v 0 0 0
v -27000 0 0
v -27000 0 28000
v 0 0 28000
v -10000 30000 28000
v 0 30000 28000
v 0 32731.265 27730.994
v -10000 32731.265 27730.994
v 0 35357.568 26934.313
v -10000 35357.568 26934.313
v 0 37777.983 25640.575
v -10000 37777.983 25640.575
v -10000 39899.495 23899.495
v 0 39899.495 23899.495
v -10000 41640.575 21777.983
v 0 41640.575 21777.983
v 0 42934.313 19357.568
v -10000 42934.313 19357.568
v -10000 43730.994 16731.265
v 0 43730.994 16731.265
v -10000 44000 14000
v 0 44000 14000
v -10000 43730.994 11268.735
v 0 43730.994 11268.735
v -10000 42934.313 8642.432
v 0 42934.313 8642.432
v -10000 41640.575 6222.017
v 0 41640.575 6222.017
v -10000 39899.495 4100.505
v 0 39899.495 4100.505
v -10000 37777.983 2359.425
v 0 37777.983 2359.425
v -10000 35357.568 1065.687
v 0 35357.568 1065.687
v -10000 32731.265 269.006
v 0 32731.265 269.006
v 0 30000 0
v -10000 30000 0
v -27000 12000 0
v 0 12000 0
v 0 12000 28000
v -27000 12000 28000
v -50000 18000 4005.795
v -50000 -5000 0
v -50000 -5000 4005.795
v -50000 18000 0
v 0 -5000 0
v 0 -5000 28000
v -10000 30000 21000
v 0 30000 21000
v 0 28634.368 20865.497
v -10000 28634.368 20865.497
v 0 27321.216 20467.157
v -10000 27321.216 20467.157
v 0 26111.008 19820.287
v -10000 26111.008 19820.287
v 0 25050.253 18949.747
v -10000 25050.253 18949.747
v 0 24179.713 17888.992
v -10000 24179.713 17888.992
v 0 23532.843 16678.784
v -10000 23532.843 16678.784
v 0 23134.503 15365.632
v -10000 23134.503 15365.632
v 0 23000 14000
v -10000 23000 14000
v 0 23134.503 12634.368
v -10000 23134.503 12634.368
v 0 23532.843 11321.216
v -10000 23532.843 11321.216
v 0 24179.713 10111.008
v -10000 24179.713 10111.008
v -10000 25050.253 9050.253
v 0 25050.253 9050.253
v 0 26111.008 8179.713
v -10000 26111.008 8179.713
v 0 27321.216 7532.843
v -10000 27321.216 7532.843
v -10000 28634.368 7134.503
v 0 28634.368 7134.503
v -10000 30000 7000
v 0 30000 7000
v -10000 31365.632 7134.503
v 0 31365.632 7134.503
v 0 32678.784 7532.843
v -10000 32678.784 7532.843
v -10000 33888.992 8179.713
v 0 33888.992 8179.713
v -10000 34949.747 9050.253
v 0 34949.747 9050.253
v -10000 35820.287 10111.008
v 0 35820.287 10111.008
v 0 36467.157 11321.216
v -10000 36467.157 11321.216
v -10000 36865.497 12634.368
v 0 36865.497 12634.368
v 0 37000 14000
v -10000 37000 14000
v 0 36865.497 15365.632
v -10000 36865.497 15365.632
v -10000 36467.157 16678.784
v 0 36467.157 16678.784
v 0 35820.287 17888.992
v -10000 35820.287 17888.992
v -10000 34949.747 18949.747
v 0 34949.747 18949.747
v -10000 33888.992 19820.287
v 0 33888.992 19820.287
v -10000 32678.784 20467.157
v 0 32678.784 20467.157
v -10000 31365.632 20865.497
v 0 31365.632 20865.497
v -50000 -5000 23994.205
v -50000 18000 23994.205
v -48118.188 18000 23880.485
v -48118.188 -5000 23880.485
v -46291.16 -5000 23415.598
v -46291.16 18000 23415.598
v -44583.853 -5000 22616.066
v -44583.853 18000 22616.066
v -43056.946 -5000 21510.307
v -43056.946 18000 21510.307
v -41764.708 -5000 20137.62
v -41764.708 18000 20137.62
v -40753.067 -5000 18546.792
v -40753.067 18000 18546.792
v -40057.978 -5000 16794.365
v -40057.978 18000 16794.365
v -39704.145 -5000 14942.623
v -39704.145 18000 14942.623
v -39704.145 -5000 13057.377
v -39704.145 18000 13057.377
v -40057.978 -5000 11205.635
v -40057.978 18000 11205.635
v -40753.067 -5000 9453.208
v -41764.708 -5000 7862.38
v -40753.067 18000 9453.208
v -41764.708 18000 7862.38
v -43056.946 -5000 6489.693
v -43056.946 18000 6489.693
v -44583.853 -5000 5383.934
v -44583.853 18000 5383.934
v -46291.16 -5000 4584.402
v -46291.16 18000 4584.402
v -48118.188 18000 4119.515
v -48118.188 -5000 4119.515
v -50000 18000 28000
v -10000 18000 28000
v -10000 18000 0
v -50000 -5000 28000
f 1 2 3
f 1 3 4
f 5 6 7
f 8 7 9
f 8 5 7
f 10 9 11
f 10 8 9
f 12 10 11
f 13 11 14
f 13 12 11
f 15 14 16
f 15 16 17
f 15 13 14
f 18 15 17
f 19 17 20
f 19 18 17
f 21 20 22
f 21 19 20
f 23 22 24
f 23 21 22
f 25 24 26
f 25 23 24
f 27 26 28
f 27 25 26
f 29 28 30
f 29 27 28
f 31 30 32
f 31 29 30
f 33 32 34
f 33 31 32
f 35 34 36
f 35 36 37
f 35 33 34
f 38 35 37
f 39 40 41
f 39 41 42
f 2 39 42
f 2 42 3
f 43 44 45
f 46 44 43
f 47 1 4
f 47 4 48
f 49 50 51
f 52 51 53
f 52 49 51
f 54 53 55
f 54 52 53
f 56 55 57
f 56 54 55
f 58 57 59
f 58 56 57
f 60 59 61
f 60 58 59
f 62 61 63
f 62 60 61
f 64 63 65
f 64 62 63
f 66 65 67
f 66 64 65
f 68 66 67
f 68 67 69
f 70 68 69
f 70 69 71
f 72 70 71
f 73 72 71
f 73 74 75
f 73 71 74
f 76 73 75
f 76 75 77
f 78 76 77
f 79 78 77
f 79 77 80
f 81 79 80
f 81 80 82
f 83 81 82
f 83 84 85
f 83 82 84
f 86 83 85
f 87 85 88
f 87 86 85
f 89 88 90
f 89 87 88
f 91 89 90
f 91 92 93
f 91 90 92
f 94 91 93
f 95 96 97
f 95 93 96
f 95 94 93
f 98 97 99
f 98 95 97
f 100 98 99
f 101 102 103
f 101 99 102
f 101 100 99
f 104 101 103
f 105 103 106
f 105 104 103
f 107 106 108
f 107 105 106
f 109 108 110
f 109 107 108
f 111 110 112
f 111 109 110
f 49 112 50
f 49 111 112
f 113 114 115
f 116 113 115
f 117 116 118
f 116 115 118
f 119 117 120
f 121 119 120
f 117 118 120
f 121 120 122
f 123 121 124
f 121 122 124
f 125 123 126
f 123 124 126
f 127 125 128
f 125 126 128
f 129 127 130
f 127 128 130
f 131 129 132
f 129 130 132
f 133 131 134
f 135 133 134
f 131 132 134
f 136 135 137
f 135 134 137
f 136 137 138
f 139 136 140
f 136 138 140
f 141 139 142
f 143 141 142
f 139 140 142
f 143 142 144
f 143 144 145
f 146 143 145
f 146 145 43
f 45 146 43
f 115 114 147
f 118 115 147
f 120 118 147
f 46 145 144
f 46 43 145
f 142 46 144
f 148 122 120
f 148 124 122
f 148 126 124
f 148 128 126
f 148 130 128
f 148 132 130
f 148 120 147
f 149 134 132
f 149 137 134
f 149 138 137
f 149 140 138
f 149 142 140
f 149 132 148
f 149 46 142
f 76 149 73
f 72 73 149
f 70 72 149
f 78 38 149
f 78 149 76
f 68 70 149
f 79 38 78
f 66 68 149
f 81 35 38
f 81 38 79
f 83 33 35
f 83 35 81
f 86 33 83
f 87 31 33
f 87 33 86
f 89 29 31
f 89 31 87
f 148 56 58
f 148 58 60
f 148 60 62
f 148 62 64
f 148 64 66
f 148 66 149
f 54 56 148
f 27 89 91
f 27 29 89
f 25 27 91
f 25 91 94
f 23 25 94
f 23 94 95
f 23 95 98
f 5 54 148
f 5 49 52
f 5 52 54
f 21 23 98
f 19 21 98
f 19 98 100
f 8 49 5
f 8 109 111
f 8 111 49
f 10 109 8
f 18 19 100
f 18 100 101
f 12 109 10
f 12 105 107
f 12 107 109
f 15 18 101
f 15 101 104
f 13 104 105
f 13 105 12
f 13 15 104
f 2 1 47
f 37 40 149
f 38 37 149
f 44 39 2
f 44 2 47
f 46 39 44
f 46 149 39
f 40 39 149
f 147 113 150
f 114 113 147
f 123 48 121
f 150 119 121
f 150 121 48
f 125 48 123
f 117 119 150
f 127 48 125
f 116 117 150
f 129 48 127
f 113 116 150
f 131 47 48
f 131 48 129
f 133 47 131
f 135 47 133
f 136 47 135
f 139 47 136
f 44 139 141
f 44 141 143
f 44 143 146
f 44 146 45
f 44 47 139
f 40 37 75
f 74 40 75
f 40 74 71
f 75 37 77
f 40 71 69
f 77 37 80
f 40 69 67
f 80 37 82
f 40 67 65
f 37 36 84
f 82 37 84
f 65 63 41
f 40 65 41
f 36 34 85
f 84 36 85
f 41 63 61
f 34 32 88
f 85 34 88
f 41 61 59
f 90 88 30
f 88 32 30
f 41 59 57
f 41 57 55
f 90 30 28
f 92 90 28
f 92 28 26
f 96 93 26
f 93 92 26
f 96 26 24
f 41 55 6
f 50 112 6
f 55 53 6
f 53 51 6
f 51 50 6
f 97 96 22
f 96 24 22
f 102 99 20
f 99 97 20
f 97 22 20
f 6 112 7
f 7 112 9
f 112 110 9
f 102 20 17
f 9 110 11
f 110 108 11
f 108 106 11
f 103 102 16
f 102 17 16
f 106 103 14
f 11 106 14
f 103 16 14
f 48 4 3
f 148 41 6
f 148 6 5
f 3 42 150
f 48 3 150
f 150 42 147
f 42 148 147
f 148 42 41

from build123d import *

# Parameters (mm, degrees)
BOSS_EXTRUDE1_DEPTH = 28000
CUT_EXTRUDE1_DEPTH  = 61750.493925052
BOSS_EXTRUDE2_DEPTH = 10000
CUT_EXTRUDE2_DEPTH  = 65727.70690062


with BuildPart() as part:
    # Sketch1 → Boss-Extrude1 (new body)
    with BuildSketch(Plane.XY):
        Polygon((0, 0), (0, -5000), (-50000, -5000), (-50000, 18000), (-10000, 18000), (-10000, 30000), (0, 30000), (0, 12000), (-27000, 12000), (-27000, 0), align=None)
    extrude(amount=BOSS_EXTRUDE1_DEPTH)

    # Sketch2 → Cut-Extrude1 (cut, through all)
    with BuildSketch(Plane(origin=(0, 18000, 0), x_dir=(1, 0, 0), z_dir=(0, 1, 0))):
        with BuildLine():
            Line((-50000, -4005.794630132), (-50000, -23994.205369868))
            ThreePointArc((-50000, -23994.205369868), (-39659.619294178, -14000), (-50000, -4005.794630132))
        make_face()
    extrude(amount=-CUT_EXTRUDE1_DEPTH, mode=Mode.SUBTRACT)

    # Sketch3 → Boss-Extrude2 (add, through all)
    with BuildSketch(Plane.ZY.offset(10000)):
        with BuildLine():
            Line((21000, 30000), (28000, 30000))
            ThreePointArc((28000, 30000), (14000, 44000), (0, 30000))
            Line((0, 30000), (7000, 30000))
            ThreePointArc((7000, 30000), (14000, 37000), (21000, 30000))
        make_face()
    extrude(amount=-BOSS_EXTRUDE2_DEPTH)

    # Sketch4 → Cut-Extrude2 (cut, through all)
    with BuildSketch(Plane.ZY.offset(10000)):
        with BuildLine():
            Line((7000, 30000), (21000, 30000))
            ThreePointArc((21000, 30000), (14000, 23000), (7000, 30000))
        make_face()
    extrude(amount=-CUT_EXTRUDE2_DEPTH, mode=Mode.SUBTRACT)


solid = part.part
